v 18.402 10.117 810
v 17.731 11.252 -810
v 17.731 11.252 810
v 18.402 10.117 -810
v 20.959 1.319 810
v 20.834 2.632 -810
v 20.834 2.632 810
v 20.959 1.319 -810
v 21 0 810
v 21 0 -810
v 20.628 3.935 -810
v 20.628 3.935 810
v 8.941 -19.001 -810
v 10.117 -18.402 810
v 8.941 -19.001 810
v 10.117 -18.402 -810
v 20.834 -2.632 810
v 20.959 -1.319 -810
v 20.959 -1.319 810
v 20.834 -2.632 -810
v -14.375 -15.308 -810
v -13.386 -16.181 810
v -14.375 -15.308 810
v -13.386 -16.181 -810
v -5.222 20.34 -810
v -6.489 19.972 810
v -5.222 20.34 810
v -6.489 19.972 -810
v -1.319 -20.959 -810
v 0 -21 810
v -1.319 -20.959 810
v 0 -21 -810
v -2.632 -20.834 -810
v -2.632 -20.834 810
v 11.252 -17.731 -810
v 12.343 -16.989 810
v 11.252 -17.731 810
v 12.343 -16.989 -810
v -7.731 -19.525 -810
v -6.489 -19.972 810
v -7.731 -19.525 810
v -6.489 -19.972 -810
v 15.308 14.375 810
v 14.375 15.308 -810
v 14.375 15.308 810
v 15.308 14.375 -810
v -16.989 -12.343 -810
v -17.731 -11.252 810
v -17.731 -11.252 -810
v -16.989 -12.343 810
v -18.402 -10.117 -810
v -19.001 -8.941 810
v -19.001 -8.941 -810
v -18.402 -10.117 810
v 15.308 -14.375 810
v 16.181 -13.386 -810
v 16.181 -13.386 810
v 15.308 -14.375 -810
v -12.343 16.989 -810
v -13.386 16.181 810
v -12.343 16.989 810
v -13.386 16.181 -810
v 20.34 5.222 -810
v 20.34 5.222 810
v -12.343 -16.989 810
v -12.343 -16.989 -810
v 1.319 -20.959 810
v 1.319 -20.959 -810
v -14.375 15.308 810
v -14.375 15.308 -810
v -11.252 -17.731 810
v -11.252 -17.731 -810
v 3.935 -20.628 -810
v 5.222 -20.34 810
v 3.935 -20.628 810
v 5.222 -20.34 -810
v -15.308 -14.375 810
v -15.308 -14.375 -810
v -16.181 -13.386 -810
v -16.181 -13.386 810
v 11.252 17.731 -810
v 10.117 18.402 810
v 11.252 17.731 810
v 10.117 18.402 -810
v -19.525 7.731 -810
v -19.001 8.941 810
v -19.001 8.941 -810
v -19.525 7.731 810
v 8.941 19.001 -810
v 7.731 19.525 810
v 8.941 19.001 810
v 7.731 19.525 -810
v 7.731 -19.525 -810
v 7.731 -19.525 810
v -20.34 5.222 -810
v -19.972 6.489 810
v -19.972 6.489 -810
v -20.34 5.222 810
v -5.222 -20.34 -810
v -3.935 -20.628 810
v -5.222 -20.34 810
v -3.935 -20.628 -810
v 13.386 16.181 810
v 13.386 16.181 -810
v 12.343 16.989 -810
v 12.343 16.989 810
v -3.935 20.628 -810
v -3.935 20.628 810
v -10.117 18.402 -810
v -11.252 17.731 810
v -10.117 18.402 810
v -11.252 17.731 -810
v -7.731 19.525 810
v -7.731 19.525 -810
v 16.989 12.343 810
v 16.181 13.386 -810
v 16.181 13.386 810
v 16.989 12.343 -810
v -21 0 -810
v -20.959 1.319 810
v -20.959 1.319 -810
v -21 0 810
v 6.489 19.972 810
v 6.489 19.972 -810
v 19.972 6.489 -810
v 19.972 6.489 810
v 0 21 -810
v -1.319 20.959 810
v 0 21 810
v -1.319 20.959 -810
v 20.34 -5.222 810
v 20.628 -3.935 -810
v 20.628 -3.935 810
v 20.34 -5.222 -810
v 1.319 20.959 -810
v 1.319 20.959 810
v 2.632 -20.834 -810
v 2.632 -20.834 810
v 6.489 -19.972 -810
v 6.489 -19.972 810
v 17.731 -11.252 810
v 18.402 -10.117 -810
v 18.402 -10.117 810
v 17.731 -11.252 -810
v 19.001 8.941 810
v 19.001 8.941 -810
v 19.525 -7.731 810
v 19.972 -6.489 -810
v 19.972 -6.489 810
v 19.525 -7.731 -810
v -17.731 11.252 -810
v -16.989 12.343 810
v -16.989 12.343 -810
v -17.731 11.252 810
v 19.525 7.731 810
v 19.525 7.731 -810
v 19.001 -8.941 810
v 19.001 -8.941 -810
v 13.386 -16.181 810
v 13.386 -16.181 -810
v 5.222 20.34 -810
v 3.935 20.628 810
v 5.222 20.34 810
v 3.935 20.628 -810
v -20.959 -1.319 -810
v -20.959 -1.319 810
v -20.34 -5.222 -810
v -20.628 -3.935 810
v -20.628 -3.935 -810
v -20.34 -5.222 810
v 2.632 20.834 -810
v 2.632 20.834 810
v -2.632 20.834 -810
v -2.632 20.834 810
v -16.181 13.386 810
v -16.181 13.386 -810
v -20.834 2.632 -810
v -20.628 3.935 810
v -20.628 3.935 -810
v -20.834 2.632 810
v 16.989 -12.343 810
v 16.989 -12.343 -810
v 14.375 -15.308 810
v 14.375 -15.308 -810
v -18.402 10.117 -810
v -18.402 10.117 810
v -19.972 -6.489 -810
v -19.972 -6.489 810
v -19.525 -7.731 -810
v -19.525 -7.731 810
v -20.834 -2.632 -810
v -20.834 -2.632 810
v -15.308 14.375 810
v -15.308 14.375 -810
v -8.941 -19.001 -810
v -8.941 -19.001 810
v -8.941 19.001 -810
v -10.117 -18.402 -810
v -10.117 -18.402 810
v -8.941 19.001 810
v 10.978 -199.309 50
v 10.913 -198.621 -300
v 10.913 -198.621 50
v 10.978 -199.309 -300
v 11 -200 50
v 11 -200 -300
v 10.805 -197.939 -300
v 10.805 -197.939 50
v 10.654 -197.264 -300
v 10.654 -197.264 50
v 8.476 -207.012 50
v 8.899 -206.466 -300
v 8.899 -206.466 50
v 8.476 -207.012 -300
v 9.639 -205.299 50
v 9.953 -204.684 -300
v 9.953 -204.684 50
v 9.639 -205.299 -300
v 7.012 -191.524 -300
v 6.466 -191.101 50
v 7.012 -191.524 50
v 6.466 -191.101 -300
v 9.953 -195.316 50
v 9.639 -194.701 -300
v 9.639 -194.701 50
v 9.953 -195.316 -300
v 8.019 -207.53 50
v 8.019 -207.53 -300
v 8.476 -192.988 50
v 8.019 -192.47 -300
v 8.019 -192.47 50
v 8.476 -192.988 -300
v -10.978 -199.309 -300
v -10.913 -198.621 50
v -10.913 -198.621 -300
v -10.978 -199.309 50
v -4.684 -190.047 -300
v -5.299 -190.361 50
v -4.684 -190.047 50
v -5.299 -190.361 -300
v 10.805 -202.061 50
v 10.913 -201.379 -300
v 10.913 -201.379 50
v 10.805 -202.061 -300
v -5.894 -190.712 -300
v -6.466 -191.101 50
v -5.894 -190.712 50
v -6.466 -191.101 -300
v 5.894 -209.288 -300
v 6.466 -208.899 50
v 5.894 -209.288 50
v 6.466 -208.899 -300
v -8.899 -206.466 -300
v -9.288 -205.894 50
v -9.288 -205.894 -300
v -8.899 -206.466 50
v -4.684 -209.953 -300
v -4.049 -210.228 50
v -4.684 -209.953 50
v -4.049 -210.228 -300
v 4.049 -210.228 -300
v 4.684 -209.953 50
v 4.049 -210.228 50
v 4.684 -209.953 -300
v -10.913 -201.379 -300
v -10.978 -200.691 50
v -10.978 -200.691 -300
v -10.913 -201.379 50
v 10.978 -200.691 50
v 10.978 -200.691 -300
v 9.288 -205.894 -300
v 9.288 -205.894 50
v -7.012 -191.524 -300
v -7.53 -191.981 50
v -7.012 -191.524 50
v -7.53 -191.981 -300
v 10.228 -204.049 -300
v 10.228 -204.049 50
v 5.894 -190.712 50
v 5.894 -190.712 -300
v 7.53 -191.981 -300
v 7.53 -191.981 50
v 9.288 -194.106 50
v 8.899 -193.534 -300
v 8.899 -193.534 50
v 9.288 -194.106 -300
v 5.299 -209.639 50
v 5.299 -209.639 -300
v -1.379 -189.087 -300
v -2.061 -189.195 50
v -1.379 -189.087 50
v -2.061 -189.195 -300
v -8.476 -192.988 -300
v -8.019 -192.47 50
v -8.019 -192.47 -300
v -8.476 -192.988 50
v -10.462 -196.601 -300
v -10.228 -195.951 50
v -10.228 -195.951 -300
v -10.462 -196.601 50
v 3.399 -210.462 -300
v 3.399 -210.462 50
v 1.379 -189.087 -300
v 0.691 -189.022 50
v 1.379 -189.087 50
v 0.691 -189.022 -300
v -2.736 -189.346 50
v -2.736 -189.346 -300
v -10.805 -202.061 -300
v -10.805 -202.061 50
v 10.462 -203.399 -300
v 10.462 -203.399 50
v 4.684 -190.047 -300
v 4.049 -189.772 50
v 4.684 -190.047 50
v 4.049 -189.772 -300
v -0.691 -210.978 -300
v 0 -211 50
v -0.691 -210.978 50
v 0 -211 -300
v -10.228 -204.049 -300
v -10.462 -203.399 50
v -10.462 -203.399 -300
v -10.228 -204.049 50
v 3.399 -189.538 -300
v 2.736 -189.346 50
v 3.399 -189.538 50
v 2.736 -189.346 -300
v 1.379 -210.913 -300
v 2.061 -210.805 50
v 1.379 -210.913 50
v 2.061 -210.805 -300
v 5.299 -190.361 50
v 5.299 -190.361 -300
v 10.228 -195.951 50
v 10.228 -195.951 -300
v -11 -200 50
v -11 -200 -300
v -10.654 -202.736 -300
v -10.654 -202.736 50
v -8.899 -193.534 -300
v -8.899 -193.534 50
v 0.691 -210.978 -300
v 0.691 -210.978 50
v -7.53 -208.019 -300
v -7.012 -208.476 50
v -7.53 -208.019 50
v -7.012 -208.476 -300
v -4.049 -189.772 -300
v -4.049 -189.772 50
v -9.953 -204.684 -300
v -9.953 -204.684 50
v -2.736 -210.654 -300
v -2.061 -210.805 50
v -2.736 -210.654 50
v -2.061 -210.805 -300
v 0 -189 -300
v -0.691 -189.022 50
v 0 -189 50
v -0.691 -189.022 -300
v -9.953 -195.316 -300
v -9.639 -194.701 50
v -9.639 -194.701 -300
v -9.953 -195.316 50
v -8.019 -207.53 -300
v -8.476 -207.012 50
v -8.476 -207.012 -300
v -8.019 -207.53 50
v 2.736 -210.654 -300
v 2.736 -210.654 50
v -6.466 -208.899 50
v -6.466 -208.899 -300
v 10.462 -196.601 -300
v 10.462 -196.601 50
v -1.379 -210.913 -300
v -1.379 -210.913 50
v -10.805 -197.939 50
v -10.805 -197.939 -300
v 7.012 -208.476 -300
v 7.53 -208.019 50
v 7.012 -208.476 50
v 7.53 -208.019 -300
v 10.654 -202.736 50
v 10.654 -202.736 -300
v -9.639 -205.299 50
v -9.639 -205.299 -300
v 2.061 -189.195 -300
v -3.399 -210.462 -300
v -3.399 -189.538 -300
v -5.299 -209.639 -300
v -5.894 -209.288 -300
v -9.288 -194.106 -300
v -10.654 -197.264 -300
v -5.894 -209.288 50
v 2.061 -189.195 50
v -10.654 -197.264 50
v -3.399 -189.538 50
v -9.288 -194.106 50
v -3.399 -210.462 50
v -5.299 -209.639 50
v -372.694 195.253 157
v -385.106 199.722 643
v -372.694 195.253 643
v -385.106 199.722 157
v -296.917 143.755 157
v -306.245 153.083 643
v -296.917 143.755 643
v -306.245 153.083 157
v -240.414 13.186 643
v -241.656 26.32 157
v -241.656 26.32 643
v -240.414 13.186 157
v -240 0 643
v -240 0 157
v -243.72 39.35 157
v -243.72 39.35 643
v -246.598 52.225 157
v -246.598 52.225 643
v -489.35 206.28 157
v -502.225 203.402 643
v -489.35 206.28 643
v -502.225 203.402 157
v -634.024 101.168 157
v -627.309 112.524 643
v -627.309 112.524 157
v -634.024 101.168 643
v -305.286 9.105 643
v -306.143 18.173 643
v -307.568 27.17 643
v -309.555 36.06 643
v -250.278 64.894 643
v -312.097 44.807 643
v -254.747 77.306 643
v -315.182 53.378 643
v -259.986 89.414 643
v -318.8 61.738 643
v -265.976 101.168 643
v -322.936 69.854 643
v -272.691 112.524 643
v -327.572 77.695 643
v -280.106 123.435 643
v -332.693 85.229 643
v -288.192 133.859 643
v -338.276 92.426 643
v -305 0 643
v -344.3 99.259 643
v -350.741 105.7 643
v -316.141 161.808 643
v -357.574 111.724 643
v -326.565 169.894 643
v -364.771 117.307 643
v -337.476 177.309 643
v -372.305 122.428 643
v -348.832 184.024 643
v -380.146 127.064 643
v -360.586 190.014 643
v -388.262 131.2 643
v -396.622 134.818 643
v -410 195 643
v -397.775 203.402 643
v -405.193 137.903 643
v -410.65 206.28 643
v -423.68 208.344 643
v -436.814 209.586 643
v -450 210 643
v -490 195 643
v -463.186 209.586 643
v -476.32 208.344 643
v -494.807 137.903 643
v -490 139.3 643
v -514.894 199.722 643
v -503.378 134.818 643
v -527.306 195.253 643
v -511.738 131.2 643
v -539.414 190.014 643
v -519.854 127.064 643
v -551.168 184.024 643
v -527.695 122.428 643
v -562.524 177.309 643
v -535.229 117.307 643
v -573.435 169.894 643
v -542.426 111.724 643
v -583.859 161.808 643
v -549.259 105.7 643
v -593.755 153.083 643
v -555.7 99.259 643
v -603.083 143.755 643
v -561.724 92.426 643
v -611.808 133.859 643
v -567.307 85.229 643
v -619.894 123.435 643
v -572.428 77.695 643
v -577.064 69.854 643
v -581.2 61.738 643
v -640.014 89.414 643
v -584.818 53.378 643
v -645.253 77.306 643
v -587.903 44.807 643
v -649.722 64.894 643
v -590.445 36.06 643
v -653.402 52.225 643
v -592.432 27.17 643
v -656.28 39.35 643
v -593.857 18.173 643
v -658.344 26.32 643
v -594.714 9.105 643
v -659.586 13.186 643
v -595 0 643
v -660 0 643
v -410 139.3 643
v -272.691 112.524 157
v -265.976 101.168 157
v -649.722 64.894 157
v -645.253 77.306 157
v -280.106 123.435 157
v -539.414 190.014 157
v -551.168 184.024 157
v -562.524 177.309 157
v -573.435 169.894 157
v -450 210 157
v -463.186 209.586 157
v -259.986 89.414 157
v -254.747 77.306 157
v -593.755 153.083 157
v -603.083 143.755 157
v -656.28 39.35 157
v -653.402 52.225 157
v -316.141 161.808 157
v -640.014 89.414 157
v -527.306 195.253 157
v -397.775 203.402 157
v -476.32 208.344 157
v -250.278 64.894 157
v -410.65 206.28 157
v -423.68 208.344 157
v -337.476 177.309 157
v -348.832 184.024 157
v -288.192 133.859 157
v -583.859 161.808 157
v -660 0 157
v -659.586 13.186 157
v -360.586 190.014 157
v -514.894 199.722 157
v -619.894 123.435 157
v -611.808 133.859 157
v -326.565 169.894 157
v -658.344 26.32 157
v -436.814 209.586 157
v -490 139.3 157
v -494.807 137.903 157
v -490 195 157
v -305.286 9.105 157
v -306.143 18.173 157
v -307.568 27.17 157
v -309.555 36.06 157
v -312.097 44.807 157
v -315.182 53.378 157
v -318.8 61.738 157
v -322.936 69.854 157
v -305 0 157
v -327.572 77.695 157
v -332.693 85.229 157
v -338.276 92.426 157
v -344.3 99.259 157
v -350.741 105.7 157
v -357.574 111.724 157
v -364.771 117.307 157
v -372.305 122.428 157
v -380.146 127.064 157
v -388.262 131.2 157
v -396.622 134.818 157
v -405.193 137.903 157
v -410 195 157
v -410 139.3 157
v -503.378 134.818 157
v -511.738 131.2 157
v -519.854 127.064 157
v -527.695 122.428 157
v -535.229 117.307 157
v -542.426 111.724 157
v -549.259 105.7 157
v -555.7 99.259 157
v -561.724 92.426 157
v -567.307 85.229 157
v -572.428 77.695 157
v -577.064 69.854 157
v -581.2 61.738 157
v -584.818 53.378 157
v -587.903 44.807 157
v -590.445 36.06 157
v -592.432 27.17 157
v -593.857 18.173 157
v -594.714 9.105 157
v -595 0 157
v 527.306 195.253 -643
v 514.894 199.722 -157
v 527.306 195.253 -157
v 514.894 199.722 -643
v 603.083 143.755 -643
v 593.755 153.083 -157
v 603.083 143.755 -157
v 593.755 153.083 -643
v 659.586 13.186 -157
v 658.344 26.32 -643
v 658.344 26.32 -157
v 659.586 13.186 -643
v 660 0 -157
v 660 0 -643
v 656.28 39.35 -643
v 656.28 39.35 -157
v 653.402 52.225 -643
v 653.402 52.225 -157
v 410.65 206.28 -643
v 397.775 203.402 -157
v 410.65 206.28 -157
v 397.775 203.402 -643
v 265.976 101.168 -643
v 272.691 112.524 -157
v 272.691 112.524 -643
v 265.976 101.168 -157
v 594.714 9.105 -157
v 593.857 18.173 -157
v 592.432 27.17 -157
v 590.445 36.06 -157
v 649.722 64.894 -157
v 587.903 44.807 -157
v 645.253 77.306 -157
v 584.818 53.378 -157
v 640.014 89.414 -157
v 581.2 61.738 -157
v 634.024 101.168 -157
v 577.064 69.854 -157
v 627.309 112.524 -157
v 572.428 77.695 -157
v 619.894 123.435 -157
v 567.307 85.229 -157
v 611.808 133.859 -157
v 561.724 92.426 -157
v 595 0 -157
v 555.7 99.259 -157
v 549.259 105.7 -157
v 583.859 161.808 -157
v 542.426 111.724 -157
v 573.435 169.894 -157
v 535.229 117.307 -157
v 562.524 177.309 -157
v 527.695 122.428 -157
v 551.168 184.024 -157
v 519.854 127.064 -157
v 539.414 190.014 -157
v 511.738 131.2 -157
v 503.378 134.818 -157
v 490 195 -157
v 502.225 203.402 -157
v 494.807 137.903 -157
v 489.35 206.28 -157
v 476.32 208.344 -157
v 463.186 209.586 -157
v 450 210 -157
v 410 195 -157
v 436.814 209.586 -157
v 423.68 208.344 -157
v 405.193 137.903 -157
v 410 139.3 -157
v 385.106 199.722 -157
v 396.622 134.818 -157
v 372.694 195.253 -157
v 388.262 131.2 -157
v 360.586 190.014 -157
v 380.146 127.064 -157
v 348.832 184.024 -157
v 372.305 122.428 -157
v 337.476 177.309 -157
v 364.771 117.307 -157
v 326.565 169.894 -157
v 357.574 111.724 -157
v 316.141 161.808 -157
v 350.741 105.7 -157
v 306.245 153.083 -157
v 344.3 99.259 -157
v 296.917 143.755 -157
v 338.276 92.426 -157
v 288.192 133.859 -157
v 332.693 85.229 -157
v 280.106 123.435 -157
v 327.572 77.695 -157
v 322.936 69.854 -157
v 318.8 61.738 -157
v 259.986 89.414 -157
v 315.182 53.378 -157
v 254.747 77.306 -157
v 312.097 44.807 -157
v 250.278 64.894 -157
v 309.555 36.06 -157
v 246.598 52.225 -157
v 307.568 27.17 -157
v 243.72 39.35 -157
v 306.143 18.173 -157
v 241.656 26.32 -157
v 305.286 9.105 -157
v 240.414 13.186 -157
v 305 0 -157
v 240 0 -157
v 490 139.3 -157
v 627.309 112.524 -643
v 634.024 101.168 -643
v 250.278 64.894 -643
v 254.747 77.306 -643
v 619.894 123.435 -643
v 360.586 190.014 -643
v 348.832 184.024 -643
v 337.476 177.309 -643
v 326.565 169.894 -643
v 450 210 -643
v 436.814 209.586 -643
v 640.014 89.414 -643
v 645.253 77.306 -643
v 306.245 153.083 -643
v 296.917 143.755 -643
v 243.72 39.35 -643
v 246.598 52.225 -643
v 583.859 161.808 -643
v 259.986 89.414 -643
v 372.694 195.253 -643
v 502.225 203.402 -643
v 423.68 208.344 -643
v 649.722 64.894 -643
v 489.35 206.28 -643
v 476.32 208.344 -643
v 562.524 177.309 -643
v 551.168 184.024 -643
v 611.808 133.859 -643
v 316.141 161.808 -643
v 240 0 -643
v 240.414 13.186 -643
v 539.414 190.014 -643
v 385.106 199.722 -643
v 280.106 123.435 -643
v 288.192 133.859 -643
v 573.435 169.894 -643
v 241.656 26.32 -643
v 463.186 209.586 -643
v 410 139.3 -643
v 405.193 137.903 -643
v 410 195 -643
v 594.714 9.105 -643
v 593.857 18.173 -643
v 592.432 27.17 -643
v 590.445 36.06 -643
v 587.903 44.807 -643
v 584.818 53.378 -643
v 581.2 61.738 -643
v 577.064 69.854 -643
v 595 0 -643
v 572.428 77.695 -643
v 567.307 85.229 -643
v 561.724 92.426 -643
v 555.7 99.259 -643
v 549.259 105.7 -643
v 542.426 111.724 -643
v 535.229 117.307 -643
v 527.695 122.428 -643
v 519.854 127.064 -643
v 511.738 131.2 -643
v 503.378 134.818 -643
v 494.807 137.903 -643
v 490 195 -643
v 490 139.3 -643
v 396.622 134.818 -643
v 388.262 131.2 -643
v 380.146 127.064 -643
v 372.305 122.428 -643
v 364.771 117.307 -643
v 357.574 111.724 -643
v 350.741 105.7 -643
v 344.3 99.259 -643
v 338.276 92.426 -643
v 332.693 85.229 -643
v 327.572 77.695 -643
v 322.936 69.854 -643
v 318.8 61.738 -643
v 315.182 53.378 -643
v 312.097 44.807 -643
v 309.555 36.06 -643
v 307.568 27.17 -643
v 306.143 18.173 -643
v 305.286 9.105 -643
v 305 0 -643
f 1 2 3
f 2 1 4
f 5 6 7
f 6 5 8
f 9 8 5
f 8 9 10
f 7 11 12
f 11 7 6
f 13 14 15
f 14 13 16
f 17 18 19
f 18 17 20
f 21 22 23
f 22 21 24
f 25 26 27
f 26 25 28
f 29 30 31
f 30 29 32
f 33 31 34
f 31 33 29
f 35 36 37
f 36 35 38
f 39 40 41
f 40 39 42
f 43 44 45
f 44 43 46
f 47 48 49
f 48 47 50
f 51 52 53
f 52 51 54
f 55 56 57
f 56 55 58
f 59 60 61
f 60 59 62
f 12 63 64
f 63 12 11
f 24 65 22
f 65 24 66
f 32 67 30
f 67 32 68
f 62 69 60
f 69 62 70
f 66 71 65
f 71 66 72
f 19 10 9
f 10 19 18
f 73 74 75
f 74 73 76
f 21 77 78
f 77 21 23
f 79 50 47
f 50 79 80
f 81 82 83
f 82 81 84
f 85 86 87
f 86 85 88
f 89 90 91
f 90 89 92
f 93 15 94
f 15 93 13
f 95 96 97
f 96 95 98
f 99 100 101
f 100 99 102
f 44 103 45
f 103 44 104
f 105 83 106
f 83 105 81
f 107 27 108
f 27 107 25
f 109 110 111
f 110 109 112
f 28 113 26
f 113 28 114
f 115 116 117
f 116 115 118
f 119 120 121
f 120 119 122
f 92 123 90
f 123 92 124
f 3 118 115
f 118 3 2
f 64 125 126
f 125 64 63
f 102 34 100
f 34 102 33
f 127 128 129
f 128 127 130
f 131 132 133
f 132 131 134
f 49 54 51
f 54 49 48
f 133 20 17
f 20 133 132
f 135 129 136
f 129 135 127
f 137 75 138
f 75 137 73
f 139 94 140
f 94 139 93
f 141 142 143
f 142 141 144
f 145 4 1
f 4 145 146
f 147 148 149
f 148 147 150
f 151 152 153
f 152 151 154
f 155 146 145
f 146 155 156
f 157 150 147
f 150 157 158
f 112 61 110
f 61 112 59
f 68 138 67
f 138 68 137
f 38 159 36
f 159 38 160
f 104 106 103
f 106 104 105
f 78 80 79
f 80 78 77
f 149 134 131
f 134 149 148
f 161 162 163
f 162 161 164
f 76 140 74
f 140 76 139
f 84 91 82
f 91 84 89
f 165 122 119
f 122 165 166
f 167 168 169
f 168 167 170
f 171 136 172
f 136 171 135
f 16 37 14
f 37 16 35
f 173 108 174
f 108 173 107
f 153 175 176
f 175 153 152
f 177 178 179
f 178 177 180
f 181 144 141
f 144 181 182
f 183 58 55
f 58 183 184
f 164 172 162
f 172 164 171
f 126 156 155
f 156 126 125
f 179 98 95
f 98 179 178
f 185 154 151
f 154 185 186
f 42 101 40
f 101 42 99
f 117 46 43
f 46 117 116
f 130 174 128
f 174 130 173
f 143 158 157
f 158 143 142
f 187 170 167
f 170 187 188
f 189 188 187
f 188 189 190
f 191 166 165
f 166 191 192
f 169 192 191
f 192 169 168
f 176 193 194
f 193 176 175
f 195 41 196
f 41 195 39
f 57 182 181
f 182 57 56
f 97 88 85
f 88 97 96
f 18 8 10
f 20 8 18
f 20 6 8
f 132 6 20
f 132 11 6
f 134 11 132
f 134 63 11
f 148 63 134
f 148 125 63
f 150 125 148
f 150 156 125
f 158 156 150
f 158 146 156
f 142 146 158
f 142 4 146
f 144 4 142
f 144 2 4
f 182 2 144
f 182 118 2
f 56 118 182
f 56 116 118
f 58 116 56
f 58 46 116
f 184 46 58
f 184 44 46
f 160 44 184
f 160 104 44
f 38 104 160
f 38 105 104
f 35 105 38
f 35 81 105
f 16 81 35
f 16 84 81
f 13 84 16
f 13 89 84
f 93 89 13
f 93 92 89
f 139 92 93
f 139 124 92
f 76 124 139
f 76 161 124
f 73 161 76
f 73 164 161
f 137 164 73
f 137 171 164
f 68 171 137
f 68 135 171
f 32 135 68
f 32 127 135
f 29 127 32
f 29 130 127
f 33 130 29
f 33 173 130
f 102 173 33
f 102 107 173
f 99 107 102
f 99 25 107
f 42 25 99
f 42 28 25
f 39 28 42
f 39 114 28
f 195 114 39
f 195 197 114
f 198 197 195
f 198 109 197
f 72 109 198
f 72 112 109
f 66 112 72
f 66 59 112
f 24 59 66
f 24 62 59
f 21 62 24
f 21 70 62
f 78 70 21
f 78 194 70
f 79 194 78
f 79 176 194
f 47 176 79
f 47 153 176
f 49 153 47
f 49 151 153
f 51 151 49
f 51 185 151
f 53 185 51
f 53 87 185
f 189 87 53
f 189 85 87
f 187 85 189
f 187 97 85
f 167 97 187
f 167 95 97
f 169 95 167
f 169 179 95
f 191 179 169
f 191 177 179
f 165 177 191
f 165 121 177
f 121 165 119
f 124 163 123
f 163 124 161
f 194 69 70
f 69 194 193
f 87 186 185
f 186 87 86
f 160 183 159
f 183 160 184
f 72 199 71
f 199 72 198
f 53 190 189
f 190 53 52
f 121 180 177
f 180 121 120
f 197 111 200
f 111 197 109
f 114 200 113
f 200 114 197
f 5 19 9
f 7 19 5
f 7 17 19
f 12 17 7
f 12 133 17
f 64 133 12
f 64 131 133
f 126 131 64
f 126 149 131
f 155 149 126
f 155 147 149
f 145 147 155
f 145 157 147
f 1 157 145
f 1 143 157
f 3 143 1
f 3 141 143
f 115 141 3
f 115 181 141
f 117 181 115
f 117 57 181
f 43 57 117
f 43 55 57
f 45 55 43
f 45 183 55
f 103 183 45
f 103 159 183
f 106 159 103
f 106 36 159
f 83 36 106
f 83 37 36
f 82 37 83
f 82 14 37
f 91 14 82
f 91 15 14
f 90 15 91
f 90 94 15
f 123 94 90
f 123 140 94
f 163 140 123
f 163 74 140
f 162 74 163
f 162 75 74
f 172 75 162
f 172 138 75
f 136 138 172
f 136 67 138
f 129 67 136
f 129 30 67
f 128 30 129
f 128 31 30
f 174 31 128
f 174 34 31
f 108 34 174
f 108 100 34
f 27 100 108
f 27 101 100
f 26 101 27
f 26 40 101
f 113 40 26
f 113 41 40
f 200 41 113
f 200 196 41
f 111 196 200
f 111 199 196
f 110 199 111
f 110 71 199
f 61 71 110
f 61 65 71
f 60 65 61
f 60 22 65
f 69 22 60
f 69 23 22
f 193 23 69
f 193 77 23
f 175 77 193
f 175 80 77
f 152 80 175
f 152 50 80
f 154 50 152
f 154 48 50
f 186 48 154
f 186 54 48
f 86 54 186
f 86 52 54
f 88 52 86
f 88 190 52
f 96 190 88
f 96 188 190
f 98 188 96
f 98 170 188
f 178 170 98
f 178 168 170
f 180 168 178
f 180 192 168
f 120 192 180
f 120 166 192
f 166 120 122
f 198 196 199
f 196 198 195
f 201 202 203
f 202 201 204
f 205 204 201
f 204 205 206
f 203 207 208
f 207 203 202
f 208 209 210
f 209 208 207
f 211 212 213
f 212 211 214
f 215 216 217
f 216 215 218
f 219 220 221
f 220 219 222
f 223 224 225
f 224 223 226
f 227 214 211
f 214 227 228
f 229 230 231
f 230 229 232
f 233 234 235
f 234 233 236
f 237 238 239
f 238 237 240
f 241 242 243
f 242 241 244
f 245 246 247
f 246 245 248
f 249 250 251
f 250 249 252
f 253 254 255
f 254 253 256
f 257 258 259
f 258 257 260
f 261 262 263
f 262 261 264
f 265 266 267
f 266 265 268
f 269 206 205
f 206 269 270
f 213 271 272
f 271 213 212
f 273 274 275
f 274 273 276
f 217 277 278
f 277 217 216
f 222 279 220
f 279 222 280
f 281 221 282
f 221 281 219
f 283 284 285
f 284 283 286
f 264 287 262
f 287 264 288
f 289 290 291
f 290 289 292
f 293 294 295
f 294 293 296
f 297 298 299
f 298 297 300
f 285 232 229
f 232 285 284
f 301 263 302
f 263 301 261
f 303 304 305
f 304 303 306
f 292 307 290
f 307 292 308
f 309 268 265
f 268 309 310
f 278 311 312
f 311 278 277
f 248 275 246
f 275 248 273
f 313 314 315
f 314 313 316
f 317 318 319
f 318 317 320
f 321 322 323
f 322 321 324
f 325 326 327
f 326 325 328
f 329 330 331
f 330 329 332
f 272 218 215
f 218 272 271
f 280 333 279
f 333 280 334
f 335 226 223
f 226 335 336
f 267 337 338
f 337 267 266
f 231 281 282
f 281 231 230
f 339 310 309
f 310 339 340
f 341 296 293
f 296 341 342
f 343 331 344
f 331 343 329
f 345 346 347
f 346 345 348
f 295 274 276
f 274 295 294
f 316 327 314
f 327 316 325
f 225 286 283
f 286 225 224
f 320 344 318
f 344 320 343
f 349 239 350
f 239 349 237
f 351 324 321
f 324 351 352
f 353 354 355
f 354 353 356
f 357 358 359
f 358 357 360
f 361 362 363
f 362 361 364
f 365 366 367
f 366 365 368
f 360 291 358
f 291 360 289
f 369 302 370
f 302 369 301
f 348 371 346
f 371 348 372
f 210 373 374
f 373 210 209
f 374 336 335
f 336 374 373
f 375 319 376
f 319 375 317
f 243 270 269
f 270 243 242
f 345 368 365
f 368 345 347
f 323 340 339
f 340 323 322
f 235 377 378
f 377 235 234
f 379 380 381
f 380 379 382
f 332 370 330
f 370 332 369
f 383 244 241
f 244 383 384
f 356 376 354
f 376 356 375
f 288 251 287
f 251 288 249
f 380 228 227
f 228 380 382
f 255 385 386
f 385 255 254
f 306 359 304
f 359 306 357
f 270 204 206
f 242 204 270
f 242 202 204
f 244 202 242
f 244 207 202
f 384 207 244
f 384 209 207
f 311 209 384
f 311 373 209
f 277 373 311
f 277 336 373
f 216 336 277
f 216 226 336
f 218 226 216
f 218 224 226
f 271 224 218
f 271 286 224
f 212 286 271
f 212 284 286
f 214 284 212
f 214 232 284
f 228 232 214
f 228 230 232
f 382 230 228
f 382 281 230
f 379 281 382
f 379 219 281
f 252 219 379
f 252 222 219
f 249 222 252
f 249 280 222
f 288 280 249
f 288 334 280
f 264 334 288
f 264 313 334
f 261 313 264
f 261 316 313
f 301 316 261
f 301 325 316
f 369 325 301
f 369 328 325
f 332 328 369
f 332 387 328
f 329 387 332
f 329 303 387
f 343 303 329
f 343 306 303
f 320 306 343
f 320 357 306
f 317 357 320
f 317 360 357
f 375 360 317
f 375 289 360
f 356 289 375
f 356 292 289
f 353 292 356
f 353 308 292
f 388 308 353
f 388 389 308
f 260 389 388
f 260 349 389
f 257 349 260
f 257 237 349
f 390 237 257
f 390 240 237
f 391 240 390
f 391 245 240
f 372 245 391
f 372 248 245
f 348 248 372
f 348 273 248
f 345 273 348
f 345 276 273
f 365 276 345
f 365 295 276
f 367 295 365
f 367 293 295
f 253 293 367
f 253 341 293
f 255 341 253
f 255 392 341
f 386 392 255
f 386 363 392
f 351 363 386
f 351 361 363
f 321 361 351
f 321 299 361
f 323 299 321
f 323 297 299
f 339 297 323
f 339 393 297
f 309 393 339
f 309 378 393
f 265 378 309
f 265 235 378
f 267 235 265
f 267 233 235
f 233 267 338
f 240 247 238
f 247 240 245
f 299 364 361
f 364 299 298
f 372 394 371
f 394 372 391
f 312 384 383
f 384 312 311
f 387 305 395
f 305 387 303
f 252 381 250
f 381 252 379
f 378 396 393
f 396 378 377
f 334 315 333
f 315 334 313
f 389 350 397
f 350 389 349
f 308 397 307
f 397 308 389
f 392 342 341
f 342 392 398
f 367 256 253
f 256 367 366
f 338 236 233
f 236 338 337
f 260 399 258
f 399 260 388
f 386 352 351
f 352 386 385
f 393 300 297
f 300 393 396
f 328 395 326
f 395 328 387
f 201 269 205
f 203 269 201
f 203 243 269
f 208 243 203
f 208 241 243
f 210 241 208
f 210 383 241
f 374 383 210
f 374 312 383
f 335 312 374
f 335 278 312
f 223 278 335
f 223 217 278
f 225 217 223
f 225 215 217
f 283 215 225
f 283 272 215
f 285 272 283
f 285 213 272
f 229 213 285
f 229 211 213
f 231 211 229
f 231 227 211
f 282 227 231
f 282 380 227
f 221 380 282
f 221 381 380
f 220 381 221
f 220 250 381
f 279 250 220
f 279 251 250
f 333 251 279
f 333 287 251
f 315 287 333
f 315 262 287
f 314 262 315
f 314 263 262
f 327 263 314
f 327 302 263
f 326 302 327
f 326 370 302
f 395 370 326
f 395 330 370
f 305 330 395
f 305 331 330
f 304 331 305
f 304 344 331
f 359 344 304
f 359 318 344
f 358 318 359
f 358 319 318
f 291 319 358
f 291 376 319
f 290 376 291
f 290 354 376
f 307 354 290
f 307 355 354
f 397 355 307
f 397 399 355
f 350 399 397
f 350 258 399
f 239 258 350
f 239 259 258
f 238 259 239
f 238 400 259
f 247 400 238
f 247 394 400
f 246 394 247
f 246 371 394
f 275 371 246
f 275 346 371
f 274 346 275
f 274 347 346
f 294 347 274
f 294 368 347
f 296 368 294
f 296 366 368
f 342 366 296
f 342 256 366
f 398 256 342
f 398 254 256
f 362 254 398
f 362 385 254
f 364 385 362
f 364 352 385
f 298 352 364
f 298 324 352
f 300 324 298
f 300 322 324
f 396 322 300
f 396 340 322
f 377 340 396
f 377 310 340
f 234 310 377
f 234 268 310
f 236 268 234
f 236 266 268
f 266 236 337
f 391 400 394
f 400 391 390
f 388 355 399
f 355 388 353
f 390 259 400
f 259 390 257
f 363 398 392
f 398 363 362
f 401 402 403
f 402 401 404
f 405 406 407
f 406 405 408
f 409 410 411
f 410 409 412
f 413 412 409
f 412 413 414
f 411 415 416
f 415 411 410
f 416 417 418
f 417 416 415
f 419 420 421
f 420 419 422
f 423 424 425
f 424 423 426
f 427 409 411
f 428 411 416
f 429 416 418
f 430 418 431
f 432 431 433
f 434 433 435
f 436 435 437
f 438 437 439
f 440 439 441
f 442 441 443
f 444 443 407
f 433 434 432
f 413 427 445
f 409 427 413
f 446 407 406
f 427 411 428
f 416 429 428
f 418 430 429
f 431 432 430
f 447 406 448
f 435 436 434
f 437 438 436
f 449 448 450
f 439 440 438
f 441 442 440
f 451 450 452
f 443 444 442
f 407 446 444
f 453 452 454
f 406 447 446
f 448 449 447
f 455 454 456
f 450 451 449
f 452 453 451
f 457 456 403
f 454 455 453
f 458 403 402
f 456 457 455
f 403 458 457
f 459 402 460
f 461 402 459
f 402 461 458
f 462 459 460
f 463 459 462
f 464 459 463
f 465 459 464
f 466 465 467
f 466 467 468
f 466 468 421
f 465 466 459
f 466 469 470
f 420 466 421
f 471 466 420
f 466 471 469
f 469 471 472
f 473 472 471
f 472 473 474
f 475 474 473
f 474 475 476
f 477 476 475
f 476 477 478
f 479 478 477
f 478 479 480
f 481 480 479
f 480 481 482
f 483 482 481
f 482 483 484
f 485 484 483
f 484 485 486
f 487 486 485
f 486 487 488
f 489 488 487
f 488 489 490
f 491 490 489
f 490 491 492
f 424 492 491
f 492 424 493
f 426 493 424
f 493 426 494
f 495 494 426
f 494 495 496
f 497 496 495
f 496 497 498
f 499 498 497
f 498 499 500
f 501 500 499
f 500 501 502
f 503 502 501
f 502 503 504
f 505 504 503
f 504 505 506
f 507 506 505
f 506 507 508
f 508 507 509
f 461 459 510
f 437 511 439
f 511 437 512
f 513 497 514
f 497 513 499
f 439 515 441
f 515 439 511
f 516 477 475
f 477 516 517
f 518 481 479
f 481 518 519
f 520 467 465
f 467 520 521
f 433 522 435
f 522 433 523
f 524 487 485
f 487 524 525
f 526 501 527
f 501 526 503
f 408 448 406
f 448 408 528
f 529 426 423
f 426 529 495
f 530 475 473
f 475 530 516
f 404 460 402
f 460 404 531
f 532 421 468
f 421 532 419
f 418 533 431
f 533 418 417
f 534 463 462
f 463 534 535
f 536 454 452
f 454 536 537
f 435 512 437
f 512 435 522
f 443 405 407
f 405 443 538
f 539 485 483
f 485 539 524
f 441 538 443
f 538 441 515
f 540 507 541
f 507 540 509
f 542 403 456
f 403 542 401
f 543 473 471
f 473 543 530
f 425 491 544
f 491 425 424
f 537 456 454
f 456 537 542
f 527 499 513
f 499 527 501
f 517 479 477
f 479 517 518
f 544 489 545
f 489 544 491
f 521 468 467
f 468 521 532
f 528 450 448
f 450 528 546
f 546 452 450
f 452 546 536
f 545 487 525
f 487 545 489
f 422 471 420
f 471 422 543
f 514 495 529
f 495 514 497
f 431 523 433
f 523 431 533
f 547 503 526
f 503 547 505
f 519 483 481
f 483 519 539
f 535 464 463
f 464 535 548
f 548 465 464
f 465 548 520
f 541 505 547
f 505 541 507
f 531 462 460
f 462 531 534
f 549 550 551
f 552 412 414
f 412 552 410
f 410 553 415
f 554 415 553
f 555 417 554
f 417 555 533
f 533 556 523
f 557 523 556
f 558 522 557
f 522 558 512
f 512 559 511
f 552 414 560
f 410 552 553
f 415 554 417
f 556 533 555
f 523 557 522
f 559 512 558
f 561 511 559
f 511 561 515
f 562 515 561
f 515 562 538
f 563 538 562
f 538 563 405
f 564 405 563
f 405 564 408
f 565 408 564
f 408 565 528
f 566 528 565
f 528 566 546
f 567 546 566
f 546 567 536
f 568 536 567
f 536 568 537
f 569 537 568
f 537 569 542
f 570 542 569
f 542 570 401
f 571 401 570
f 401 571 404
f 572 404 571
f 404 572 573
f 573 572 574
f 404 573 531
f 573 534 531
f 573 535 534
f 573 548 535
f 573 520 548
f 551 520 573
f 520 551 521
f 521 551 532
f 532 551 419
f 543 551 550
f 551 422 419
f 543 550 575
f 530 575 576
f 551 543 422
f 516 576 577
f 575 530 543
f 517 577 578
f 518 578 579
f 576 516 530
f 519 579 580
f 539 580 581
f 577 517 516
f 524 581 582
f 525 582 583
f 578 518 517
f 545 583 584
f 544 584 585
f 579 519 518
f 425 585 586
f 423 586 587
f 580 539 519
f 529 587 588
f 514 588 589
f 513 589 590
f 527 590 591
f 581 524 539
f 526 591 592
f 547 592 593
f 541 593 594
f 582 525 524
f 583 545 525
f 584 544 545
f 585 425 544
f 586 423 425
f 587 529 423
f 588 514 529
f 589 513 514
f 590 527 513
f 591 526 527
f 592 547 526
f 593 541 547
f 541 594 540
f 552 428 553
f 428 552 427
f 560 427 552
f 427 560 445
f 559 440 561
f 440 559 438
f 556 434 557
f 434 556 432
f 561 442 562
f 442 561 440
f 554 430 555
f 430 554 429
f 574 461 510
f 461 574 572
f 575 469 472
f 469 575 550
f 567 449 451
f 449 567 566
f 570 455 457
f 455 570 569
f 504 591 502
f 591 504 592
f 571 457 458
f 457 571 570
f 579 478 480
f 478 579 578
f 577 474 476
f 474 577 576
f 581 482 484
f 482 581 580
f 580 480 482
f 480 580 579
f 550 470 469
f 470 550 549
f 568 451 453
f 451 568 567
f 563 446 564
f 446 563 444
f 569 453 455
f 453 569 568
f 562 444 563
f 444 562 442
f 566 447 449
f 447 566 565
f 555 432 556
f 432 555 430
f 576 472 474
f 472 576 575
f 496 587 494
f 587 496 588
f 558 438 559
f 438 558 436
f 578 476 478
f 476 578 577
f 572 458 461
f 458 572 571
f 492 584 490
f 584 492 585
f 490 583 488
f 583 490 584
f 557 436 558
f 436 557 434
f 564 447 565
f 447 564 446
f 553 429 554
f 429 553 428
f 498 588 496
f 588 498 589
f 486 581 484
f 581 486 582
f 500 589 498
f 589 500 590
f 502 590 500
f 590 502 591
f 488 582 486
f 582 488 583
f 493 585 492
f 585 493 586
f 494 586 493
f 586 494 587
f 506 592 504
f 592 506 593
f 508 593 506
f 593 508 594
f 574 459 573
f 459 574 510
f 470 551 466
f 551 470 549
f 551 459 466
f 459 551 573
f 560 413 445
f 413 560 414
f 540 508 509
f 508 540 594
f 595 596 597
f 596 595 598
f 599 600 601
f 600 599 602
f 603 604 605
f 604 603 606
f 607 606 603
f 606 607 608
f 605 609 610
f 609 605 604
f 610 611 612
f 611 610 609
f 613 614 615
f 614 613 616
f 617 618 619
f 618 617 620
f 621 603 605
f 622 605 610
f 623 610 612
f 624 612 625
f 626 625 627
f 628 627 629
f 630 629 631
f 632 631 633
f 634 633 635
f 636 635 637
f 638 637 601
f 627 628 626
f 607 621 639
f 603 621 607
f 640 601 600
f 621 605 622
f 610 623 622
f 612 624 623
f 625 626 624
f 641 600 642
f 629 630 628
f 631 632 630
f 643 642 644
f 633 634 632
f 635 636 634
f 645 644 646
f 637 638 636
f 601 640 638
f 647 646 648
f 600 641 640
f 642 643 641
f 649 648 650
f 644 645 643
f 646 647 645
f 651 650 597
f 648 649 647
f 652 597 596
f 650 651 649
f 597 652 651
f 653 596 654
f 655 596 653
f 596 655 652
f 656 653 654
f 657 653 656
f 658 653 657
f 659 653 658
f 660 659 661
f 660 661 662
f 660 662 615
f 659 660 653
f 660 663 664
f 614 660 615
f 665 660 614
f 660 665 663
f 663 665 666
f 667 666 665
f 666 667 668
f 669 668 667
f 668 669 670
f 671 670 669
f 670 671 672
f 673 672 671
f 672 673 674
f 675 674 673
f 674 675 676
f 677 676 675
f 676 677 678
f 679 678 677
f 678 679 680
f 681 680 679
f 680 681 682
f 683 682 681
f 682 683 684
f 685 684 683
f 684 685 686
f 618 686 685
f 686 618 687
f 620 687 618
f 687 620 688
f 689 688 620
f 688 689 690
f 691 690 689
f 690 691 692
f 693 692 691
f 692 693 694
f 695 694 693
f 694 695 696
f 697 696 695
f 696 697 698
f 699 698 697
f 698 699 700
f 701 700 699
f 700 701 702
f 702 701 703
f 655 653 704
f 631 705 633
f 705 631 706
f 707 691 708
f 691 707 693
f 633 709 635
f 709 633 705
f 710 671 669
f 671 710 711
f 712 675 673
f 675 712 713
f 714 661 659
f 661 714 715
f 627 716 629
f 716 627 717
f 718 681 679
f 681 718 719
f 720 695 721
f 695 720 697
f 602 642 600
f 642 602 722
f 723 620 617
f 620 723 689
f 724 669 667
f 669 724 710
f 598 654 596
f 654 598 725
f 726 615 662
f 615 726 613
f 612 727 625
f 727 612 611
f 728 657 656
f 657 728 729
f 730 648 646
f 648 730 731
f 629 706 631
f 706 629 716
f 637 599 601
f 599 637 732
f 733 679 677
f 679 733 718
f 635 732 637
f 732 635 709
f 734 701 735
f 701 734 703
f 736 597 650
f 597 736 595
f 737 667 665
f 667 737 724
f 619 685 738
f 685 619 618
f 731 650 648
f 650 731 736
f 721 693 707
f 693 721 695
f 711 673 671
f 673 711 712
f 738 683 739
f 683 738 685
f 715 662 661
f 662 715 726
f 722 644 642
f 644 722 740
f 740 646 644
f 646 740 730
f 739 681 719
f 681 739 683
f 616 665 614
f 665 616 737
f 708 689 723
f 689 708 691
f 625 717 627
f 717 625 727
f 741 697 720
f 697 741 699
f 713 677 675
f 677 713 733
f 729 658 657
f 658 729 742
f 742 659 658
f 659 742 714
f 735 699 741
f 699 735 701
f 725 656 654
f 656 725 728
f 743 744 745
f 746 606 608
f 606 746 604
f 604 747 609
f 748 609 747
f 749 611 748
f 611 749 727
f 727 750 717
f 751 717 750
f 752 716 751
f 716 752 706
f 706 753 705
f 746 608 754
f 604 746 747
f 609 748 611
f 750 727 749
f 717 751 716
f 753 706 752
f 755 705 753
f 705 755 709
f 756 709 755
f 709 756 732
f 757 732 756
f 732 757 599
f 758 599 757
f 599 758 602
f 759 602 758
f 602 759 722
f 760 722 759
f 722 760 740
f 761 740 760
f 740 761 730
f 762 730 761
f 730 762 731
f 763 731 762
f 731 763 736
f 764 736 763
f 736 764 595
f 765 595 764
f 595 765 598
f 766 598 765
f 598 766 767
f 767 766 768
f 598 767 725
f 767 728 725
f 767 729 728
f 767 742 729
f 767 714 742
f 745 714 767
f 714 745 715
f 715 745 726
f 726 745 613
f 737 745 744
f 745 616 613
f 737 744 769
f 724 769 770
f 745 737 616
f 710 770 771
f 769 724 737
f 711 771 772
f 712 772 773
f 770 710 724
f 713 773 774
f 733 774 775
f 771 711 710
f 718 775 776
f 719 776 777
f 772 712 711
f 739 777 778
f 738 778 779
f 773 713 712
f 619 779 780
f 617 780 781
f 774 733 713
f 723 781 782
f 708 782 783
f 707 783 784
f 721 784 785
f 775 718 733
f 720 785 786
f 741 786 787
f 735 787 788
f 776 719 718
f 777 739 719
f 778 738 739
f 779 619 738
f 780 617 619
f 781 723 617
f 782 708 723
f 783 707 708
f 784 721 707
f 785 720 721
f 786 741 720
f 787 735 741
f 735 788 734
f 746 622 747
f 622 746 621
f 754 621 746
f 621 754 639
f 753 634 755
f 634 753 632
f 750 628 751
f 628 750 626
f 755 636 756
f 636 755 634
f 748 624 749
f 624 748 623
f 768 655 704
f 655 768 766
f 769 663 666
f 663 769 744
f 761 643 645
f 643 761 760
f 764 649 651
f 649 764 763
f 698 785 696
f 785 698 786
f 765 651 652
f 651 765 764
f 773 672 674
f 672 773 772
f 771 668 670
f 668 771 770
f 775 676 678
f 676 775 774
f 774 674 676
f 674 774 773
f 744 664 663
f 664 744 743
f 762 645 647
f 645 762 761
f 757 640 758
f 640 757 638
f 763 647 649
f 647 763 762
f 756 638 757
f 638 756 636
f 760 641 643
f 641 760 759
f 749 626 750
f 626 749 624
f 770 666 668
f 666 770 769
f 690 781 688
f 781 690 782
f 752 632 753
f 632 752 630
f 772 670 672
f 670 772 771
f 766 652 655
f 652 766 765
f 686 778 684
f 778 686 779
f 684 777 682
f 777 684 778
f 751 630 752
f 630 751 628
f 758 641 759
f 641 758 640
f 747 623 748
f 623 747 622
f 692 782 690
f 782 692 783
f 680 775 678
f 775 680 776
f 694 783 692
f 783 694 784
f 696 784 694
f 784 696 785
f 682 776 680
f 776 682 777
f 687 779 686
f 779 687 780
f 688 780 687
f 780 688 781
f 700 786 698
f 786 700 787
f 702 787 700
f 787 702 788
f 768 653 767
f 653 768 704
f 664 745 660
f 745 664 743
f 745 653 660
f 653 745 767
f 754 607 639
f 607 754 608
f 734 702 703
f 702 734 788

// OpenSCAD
// ============================================================================
// PROJECT: XXXG-00W0 WING GUNDAM ZERO EW - LIMB SKELETON PROTECTION
// COMPONENT VAULT: BANDAI CAST RUNNER B - FOREARM CORES B11 & B12
// PACKAGING RE-ARCHITECTURE: DUAL-MOTION EMA DRIVE CHAMBER INTEGRATION
// DESIGN STYLE: NVIDIA FOUNDERS EDITION AGGRESSIVE PLANAR GEOMETRIC MATRIX
// CONFIG METRIC: SCALED TITANIUM CASTS WITH COIL TRACKS (1:1 ACTUAL METRIC)
// ============================================================================

$fn = 100; // High-precision circular resolution segment count

// Structural Constants Scaled 1:1 for a 16.7-Meter Airframe Scale (mm)
forearm_total_length = 1080;             // Total longitudinal vertical height (mm)
ema_chamber_diameter = 290;             // Internal cavity diameter for EMA housing (mm)
armor_skin_thickness = 65;              // Solid TiAl protective plating wall (mm)
harness_conduit_width = 80;             // Cast-in 4oz copper logic trace track (mm)
capacitor_pocket_depth = 15;            // Sub-armor recessed housing pocket depth (mm)
capacitor_pocket_width = 140;           // Transverse MLCC array pocket width (mm)

module Runner_B_Forearm_Core_Forge() {
    // Central Supply Injection Runner Axis (Molten Feed Line from Siphon Forge)
    color([0.25, 0.25, 0.28]) {
        cylinder(h = forearm_total_length * 1.5, d = 42, center = true);
        // Direct injection gates tracking straight into the part mold cavities
        translate() rotate() cylinder(h = 350, d = 22);
        translate([0, -200, -300]) rotate() cylinder(h = 350, d = 22);
    }
    
    // Instantiate Scaled Skeutomorphic Part Molds Symmetrically (Left & Right)
    Cast_Internal_Forearm_Cores();
}

module Cast_Internal_Forearm_Cores() {
    // ---- PART B11: INTERNAL LEFT STRUCTURAL UPPER FOREARM CORE ----
    translate([-450, 0, 400]) color([0.35, 0.35, 0.38]) { // Inner Frame Dark Spec
        difference() {
            // Main solid heavy-duty low-poly outer bone block envelope
            cylinder(h = forearm_total_length * 0.45, d = ema_chamber_diameter + (armor_skin_thickness * 2), center = true);
            
            // DUAL-MOTION EMA CYLINDER EXCAVATION [Bored out for power-by-wire cores]
            cylinder(h = forearm_total_length * 0.5, d = ema_chamber_diameter, center = true);
            
            // SUB-ARMOR RECESSED CAPACITOR POCKETS [Segmented rows cut inside the armor inner wall]
            for (z_offset = [-150, 0, 150]) {
                translate([0, (ema_chamber_diameter/2 - armor_skin_thickness + capacitor_pocket_depth/2 + 20), z_offset])
                    cube([capacitor_pocket_width, capacitor_pocket_depth, 100], center = true);
            }
            
            // Continuous cast-in routing track for the 4oz solid-state wiring rails
            cube([harness_conduit_width, ema_chamber_diameter + 100, forearm_total_length], center = true);
            
            // Slicing profile tool to generate an asymmetrical half-shell part component
            translate([0, -ema_chamber_diameter, 0])
                cube([ema_chamber_diameter * 2, ema_chamber_diameter * 2, forearm_total_length * 2], center = true);
        }
    }
    
    // ---- PART B12: INTERNAL RIGHT STRUCTURAL UPPER FOREARM CORE ----
    translate([450, 0, -400]) rotate() color([0.35, 0.35, 0.38]) {
        difference() {
            cylinder(h = forearm_total_length * 0.45, d = ema_chamber_diameter + (armor_skin_thickness * 2), center = true);
            cylinder(h = forearm_total_length * 0.5, d = ema_chamber_diameter, center = true);
            
            for (z_offset = [-150, 0, 150]) {
                translate([0, (ema_chamber_diameter/2 - armor_skin_thickness + capacitor_pocket_depth/2 + 20), z_offset])
                    cube([capacitor_pocket_width, capacitor_pocket_depth, 100], center = true);
            }
            
            cube([harness_conduit_width, ema_chamber_diameter + 100, forearm_total_length], center = true);
            translate([0, -ema_chamber_diameter, 0])
                cube([ema_chamber_diameter * 2, ema_chamber_diameter * 2, forearm_total_length * 2], center = true);
        }
    }
}

// Render Master Assembly to Parameter Workspace
Runner_B_Forearm_Core_Forge();
